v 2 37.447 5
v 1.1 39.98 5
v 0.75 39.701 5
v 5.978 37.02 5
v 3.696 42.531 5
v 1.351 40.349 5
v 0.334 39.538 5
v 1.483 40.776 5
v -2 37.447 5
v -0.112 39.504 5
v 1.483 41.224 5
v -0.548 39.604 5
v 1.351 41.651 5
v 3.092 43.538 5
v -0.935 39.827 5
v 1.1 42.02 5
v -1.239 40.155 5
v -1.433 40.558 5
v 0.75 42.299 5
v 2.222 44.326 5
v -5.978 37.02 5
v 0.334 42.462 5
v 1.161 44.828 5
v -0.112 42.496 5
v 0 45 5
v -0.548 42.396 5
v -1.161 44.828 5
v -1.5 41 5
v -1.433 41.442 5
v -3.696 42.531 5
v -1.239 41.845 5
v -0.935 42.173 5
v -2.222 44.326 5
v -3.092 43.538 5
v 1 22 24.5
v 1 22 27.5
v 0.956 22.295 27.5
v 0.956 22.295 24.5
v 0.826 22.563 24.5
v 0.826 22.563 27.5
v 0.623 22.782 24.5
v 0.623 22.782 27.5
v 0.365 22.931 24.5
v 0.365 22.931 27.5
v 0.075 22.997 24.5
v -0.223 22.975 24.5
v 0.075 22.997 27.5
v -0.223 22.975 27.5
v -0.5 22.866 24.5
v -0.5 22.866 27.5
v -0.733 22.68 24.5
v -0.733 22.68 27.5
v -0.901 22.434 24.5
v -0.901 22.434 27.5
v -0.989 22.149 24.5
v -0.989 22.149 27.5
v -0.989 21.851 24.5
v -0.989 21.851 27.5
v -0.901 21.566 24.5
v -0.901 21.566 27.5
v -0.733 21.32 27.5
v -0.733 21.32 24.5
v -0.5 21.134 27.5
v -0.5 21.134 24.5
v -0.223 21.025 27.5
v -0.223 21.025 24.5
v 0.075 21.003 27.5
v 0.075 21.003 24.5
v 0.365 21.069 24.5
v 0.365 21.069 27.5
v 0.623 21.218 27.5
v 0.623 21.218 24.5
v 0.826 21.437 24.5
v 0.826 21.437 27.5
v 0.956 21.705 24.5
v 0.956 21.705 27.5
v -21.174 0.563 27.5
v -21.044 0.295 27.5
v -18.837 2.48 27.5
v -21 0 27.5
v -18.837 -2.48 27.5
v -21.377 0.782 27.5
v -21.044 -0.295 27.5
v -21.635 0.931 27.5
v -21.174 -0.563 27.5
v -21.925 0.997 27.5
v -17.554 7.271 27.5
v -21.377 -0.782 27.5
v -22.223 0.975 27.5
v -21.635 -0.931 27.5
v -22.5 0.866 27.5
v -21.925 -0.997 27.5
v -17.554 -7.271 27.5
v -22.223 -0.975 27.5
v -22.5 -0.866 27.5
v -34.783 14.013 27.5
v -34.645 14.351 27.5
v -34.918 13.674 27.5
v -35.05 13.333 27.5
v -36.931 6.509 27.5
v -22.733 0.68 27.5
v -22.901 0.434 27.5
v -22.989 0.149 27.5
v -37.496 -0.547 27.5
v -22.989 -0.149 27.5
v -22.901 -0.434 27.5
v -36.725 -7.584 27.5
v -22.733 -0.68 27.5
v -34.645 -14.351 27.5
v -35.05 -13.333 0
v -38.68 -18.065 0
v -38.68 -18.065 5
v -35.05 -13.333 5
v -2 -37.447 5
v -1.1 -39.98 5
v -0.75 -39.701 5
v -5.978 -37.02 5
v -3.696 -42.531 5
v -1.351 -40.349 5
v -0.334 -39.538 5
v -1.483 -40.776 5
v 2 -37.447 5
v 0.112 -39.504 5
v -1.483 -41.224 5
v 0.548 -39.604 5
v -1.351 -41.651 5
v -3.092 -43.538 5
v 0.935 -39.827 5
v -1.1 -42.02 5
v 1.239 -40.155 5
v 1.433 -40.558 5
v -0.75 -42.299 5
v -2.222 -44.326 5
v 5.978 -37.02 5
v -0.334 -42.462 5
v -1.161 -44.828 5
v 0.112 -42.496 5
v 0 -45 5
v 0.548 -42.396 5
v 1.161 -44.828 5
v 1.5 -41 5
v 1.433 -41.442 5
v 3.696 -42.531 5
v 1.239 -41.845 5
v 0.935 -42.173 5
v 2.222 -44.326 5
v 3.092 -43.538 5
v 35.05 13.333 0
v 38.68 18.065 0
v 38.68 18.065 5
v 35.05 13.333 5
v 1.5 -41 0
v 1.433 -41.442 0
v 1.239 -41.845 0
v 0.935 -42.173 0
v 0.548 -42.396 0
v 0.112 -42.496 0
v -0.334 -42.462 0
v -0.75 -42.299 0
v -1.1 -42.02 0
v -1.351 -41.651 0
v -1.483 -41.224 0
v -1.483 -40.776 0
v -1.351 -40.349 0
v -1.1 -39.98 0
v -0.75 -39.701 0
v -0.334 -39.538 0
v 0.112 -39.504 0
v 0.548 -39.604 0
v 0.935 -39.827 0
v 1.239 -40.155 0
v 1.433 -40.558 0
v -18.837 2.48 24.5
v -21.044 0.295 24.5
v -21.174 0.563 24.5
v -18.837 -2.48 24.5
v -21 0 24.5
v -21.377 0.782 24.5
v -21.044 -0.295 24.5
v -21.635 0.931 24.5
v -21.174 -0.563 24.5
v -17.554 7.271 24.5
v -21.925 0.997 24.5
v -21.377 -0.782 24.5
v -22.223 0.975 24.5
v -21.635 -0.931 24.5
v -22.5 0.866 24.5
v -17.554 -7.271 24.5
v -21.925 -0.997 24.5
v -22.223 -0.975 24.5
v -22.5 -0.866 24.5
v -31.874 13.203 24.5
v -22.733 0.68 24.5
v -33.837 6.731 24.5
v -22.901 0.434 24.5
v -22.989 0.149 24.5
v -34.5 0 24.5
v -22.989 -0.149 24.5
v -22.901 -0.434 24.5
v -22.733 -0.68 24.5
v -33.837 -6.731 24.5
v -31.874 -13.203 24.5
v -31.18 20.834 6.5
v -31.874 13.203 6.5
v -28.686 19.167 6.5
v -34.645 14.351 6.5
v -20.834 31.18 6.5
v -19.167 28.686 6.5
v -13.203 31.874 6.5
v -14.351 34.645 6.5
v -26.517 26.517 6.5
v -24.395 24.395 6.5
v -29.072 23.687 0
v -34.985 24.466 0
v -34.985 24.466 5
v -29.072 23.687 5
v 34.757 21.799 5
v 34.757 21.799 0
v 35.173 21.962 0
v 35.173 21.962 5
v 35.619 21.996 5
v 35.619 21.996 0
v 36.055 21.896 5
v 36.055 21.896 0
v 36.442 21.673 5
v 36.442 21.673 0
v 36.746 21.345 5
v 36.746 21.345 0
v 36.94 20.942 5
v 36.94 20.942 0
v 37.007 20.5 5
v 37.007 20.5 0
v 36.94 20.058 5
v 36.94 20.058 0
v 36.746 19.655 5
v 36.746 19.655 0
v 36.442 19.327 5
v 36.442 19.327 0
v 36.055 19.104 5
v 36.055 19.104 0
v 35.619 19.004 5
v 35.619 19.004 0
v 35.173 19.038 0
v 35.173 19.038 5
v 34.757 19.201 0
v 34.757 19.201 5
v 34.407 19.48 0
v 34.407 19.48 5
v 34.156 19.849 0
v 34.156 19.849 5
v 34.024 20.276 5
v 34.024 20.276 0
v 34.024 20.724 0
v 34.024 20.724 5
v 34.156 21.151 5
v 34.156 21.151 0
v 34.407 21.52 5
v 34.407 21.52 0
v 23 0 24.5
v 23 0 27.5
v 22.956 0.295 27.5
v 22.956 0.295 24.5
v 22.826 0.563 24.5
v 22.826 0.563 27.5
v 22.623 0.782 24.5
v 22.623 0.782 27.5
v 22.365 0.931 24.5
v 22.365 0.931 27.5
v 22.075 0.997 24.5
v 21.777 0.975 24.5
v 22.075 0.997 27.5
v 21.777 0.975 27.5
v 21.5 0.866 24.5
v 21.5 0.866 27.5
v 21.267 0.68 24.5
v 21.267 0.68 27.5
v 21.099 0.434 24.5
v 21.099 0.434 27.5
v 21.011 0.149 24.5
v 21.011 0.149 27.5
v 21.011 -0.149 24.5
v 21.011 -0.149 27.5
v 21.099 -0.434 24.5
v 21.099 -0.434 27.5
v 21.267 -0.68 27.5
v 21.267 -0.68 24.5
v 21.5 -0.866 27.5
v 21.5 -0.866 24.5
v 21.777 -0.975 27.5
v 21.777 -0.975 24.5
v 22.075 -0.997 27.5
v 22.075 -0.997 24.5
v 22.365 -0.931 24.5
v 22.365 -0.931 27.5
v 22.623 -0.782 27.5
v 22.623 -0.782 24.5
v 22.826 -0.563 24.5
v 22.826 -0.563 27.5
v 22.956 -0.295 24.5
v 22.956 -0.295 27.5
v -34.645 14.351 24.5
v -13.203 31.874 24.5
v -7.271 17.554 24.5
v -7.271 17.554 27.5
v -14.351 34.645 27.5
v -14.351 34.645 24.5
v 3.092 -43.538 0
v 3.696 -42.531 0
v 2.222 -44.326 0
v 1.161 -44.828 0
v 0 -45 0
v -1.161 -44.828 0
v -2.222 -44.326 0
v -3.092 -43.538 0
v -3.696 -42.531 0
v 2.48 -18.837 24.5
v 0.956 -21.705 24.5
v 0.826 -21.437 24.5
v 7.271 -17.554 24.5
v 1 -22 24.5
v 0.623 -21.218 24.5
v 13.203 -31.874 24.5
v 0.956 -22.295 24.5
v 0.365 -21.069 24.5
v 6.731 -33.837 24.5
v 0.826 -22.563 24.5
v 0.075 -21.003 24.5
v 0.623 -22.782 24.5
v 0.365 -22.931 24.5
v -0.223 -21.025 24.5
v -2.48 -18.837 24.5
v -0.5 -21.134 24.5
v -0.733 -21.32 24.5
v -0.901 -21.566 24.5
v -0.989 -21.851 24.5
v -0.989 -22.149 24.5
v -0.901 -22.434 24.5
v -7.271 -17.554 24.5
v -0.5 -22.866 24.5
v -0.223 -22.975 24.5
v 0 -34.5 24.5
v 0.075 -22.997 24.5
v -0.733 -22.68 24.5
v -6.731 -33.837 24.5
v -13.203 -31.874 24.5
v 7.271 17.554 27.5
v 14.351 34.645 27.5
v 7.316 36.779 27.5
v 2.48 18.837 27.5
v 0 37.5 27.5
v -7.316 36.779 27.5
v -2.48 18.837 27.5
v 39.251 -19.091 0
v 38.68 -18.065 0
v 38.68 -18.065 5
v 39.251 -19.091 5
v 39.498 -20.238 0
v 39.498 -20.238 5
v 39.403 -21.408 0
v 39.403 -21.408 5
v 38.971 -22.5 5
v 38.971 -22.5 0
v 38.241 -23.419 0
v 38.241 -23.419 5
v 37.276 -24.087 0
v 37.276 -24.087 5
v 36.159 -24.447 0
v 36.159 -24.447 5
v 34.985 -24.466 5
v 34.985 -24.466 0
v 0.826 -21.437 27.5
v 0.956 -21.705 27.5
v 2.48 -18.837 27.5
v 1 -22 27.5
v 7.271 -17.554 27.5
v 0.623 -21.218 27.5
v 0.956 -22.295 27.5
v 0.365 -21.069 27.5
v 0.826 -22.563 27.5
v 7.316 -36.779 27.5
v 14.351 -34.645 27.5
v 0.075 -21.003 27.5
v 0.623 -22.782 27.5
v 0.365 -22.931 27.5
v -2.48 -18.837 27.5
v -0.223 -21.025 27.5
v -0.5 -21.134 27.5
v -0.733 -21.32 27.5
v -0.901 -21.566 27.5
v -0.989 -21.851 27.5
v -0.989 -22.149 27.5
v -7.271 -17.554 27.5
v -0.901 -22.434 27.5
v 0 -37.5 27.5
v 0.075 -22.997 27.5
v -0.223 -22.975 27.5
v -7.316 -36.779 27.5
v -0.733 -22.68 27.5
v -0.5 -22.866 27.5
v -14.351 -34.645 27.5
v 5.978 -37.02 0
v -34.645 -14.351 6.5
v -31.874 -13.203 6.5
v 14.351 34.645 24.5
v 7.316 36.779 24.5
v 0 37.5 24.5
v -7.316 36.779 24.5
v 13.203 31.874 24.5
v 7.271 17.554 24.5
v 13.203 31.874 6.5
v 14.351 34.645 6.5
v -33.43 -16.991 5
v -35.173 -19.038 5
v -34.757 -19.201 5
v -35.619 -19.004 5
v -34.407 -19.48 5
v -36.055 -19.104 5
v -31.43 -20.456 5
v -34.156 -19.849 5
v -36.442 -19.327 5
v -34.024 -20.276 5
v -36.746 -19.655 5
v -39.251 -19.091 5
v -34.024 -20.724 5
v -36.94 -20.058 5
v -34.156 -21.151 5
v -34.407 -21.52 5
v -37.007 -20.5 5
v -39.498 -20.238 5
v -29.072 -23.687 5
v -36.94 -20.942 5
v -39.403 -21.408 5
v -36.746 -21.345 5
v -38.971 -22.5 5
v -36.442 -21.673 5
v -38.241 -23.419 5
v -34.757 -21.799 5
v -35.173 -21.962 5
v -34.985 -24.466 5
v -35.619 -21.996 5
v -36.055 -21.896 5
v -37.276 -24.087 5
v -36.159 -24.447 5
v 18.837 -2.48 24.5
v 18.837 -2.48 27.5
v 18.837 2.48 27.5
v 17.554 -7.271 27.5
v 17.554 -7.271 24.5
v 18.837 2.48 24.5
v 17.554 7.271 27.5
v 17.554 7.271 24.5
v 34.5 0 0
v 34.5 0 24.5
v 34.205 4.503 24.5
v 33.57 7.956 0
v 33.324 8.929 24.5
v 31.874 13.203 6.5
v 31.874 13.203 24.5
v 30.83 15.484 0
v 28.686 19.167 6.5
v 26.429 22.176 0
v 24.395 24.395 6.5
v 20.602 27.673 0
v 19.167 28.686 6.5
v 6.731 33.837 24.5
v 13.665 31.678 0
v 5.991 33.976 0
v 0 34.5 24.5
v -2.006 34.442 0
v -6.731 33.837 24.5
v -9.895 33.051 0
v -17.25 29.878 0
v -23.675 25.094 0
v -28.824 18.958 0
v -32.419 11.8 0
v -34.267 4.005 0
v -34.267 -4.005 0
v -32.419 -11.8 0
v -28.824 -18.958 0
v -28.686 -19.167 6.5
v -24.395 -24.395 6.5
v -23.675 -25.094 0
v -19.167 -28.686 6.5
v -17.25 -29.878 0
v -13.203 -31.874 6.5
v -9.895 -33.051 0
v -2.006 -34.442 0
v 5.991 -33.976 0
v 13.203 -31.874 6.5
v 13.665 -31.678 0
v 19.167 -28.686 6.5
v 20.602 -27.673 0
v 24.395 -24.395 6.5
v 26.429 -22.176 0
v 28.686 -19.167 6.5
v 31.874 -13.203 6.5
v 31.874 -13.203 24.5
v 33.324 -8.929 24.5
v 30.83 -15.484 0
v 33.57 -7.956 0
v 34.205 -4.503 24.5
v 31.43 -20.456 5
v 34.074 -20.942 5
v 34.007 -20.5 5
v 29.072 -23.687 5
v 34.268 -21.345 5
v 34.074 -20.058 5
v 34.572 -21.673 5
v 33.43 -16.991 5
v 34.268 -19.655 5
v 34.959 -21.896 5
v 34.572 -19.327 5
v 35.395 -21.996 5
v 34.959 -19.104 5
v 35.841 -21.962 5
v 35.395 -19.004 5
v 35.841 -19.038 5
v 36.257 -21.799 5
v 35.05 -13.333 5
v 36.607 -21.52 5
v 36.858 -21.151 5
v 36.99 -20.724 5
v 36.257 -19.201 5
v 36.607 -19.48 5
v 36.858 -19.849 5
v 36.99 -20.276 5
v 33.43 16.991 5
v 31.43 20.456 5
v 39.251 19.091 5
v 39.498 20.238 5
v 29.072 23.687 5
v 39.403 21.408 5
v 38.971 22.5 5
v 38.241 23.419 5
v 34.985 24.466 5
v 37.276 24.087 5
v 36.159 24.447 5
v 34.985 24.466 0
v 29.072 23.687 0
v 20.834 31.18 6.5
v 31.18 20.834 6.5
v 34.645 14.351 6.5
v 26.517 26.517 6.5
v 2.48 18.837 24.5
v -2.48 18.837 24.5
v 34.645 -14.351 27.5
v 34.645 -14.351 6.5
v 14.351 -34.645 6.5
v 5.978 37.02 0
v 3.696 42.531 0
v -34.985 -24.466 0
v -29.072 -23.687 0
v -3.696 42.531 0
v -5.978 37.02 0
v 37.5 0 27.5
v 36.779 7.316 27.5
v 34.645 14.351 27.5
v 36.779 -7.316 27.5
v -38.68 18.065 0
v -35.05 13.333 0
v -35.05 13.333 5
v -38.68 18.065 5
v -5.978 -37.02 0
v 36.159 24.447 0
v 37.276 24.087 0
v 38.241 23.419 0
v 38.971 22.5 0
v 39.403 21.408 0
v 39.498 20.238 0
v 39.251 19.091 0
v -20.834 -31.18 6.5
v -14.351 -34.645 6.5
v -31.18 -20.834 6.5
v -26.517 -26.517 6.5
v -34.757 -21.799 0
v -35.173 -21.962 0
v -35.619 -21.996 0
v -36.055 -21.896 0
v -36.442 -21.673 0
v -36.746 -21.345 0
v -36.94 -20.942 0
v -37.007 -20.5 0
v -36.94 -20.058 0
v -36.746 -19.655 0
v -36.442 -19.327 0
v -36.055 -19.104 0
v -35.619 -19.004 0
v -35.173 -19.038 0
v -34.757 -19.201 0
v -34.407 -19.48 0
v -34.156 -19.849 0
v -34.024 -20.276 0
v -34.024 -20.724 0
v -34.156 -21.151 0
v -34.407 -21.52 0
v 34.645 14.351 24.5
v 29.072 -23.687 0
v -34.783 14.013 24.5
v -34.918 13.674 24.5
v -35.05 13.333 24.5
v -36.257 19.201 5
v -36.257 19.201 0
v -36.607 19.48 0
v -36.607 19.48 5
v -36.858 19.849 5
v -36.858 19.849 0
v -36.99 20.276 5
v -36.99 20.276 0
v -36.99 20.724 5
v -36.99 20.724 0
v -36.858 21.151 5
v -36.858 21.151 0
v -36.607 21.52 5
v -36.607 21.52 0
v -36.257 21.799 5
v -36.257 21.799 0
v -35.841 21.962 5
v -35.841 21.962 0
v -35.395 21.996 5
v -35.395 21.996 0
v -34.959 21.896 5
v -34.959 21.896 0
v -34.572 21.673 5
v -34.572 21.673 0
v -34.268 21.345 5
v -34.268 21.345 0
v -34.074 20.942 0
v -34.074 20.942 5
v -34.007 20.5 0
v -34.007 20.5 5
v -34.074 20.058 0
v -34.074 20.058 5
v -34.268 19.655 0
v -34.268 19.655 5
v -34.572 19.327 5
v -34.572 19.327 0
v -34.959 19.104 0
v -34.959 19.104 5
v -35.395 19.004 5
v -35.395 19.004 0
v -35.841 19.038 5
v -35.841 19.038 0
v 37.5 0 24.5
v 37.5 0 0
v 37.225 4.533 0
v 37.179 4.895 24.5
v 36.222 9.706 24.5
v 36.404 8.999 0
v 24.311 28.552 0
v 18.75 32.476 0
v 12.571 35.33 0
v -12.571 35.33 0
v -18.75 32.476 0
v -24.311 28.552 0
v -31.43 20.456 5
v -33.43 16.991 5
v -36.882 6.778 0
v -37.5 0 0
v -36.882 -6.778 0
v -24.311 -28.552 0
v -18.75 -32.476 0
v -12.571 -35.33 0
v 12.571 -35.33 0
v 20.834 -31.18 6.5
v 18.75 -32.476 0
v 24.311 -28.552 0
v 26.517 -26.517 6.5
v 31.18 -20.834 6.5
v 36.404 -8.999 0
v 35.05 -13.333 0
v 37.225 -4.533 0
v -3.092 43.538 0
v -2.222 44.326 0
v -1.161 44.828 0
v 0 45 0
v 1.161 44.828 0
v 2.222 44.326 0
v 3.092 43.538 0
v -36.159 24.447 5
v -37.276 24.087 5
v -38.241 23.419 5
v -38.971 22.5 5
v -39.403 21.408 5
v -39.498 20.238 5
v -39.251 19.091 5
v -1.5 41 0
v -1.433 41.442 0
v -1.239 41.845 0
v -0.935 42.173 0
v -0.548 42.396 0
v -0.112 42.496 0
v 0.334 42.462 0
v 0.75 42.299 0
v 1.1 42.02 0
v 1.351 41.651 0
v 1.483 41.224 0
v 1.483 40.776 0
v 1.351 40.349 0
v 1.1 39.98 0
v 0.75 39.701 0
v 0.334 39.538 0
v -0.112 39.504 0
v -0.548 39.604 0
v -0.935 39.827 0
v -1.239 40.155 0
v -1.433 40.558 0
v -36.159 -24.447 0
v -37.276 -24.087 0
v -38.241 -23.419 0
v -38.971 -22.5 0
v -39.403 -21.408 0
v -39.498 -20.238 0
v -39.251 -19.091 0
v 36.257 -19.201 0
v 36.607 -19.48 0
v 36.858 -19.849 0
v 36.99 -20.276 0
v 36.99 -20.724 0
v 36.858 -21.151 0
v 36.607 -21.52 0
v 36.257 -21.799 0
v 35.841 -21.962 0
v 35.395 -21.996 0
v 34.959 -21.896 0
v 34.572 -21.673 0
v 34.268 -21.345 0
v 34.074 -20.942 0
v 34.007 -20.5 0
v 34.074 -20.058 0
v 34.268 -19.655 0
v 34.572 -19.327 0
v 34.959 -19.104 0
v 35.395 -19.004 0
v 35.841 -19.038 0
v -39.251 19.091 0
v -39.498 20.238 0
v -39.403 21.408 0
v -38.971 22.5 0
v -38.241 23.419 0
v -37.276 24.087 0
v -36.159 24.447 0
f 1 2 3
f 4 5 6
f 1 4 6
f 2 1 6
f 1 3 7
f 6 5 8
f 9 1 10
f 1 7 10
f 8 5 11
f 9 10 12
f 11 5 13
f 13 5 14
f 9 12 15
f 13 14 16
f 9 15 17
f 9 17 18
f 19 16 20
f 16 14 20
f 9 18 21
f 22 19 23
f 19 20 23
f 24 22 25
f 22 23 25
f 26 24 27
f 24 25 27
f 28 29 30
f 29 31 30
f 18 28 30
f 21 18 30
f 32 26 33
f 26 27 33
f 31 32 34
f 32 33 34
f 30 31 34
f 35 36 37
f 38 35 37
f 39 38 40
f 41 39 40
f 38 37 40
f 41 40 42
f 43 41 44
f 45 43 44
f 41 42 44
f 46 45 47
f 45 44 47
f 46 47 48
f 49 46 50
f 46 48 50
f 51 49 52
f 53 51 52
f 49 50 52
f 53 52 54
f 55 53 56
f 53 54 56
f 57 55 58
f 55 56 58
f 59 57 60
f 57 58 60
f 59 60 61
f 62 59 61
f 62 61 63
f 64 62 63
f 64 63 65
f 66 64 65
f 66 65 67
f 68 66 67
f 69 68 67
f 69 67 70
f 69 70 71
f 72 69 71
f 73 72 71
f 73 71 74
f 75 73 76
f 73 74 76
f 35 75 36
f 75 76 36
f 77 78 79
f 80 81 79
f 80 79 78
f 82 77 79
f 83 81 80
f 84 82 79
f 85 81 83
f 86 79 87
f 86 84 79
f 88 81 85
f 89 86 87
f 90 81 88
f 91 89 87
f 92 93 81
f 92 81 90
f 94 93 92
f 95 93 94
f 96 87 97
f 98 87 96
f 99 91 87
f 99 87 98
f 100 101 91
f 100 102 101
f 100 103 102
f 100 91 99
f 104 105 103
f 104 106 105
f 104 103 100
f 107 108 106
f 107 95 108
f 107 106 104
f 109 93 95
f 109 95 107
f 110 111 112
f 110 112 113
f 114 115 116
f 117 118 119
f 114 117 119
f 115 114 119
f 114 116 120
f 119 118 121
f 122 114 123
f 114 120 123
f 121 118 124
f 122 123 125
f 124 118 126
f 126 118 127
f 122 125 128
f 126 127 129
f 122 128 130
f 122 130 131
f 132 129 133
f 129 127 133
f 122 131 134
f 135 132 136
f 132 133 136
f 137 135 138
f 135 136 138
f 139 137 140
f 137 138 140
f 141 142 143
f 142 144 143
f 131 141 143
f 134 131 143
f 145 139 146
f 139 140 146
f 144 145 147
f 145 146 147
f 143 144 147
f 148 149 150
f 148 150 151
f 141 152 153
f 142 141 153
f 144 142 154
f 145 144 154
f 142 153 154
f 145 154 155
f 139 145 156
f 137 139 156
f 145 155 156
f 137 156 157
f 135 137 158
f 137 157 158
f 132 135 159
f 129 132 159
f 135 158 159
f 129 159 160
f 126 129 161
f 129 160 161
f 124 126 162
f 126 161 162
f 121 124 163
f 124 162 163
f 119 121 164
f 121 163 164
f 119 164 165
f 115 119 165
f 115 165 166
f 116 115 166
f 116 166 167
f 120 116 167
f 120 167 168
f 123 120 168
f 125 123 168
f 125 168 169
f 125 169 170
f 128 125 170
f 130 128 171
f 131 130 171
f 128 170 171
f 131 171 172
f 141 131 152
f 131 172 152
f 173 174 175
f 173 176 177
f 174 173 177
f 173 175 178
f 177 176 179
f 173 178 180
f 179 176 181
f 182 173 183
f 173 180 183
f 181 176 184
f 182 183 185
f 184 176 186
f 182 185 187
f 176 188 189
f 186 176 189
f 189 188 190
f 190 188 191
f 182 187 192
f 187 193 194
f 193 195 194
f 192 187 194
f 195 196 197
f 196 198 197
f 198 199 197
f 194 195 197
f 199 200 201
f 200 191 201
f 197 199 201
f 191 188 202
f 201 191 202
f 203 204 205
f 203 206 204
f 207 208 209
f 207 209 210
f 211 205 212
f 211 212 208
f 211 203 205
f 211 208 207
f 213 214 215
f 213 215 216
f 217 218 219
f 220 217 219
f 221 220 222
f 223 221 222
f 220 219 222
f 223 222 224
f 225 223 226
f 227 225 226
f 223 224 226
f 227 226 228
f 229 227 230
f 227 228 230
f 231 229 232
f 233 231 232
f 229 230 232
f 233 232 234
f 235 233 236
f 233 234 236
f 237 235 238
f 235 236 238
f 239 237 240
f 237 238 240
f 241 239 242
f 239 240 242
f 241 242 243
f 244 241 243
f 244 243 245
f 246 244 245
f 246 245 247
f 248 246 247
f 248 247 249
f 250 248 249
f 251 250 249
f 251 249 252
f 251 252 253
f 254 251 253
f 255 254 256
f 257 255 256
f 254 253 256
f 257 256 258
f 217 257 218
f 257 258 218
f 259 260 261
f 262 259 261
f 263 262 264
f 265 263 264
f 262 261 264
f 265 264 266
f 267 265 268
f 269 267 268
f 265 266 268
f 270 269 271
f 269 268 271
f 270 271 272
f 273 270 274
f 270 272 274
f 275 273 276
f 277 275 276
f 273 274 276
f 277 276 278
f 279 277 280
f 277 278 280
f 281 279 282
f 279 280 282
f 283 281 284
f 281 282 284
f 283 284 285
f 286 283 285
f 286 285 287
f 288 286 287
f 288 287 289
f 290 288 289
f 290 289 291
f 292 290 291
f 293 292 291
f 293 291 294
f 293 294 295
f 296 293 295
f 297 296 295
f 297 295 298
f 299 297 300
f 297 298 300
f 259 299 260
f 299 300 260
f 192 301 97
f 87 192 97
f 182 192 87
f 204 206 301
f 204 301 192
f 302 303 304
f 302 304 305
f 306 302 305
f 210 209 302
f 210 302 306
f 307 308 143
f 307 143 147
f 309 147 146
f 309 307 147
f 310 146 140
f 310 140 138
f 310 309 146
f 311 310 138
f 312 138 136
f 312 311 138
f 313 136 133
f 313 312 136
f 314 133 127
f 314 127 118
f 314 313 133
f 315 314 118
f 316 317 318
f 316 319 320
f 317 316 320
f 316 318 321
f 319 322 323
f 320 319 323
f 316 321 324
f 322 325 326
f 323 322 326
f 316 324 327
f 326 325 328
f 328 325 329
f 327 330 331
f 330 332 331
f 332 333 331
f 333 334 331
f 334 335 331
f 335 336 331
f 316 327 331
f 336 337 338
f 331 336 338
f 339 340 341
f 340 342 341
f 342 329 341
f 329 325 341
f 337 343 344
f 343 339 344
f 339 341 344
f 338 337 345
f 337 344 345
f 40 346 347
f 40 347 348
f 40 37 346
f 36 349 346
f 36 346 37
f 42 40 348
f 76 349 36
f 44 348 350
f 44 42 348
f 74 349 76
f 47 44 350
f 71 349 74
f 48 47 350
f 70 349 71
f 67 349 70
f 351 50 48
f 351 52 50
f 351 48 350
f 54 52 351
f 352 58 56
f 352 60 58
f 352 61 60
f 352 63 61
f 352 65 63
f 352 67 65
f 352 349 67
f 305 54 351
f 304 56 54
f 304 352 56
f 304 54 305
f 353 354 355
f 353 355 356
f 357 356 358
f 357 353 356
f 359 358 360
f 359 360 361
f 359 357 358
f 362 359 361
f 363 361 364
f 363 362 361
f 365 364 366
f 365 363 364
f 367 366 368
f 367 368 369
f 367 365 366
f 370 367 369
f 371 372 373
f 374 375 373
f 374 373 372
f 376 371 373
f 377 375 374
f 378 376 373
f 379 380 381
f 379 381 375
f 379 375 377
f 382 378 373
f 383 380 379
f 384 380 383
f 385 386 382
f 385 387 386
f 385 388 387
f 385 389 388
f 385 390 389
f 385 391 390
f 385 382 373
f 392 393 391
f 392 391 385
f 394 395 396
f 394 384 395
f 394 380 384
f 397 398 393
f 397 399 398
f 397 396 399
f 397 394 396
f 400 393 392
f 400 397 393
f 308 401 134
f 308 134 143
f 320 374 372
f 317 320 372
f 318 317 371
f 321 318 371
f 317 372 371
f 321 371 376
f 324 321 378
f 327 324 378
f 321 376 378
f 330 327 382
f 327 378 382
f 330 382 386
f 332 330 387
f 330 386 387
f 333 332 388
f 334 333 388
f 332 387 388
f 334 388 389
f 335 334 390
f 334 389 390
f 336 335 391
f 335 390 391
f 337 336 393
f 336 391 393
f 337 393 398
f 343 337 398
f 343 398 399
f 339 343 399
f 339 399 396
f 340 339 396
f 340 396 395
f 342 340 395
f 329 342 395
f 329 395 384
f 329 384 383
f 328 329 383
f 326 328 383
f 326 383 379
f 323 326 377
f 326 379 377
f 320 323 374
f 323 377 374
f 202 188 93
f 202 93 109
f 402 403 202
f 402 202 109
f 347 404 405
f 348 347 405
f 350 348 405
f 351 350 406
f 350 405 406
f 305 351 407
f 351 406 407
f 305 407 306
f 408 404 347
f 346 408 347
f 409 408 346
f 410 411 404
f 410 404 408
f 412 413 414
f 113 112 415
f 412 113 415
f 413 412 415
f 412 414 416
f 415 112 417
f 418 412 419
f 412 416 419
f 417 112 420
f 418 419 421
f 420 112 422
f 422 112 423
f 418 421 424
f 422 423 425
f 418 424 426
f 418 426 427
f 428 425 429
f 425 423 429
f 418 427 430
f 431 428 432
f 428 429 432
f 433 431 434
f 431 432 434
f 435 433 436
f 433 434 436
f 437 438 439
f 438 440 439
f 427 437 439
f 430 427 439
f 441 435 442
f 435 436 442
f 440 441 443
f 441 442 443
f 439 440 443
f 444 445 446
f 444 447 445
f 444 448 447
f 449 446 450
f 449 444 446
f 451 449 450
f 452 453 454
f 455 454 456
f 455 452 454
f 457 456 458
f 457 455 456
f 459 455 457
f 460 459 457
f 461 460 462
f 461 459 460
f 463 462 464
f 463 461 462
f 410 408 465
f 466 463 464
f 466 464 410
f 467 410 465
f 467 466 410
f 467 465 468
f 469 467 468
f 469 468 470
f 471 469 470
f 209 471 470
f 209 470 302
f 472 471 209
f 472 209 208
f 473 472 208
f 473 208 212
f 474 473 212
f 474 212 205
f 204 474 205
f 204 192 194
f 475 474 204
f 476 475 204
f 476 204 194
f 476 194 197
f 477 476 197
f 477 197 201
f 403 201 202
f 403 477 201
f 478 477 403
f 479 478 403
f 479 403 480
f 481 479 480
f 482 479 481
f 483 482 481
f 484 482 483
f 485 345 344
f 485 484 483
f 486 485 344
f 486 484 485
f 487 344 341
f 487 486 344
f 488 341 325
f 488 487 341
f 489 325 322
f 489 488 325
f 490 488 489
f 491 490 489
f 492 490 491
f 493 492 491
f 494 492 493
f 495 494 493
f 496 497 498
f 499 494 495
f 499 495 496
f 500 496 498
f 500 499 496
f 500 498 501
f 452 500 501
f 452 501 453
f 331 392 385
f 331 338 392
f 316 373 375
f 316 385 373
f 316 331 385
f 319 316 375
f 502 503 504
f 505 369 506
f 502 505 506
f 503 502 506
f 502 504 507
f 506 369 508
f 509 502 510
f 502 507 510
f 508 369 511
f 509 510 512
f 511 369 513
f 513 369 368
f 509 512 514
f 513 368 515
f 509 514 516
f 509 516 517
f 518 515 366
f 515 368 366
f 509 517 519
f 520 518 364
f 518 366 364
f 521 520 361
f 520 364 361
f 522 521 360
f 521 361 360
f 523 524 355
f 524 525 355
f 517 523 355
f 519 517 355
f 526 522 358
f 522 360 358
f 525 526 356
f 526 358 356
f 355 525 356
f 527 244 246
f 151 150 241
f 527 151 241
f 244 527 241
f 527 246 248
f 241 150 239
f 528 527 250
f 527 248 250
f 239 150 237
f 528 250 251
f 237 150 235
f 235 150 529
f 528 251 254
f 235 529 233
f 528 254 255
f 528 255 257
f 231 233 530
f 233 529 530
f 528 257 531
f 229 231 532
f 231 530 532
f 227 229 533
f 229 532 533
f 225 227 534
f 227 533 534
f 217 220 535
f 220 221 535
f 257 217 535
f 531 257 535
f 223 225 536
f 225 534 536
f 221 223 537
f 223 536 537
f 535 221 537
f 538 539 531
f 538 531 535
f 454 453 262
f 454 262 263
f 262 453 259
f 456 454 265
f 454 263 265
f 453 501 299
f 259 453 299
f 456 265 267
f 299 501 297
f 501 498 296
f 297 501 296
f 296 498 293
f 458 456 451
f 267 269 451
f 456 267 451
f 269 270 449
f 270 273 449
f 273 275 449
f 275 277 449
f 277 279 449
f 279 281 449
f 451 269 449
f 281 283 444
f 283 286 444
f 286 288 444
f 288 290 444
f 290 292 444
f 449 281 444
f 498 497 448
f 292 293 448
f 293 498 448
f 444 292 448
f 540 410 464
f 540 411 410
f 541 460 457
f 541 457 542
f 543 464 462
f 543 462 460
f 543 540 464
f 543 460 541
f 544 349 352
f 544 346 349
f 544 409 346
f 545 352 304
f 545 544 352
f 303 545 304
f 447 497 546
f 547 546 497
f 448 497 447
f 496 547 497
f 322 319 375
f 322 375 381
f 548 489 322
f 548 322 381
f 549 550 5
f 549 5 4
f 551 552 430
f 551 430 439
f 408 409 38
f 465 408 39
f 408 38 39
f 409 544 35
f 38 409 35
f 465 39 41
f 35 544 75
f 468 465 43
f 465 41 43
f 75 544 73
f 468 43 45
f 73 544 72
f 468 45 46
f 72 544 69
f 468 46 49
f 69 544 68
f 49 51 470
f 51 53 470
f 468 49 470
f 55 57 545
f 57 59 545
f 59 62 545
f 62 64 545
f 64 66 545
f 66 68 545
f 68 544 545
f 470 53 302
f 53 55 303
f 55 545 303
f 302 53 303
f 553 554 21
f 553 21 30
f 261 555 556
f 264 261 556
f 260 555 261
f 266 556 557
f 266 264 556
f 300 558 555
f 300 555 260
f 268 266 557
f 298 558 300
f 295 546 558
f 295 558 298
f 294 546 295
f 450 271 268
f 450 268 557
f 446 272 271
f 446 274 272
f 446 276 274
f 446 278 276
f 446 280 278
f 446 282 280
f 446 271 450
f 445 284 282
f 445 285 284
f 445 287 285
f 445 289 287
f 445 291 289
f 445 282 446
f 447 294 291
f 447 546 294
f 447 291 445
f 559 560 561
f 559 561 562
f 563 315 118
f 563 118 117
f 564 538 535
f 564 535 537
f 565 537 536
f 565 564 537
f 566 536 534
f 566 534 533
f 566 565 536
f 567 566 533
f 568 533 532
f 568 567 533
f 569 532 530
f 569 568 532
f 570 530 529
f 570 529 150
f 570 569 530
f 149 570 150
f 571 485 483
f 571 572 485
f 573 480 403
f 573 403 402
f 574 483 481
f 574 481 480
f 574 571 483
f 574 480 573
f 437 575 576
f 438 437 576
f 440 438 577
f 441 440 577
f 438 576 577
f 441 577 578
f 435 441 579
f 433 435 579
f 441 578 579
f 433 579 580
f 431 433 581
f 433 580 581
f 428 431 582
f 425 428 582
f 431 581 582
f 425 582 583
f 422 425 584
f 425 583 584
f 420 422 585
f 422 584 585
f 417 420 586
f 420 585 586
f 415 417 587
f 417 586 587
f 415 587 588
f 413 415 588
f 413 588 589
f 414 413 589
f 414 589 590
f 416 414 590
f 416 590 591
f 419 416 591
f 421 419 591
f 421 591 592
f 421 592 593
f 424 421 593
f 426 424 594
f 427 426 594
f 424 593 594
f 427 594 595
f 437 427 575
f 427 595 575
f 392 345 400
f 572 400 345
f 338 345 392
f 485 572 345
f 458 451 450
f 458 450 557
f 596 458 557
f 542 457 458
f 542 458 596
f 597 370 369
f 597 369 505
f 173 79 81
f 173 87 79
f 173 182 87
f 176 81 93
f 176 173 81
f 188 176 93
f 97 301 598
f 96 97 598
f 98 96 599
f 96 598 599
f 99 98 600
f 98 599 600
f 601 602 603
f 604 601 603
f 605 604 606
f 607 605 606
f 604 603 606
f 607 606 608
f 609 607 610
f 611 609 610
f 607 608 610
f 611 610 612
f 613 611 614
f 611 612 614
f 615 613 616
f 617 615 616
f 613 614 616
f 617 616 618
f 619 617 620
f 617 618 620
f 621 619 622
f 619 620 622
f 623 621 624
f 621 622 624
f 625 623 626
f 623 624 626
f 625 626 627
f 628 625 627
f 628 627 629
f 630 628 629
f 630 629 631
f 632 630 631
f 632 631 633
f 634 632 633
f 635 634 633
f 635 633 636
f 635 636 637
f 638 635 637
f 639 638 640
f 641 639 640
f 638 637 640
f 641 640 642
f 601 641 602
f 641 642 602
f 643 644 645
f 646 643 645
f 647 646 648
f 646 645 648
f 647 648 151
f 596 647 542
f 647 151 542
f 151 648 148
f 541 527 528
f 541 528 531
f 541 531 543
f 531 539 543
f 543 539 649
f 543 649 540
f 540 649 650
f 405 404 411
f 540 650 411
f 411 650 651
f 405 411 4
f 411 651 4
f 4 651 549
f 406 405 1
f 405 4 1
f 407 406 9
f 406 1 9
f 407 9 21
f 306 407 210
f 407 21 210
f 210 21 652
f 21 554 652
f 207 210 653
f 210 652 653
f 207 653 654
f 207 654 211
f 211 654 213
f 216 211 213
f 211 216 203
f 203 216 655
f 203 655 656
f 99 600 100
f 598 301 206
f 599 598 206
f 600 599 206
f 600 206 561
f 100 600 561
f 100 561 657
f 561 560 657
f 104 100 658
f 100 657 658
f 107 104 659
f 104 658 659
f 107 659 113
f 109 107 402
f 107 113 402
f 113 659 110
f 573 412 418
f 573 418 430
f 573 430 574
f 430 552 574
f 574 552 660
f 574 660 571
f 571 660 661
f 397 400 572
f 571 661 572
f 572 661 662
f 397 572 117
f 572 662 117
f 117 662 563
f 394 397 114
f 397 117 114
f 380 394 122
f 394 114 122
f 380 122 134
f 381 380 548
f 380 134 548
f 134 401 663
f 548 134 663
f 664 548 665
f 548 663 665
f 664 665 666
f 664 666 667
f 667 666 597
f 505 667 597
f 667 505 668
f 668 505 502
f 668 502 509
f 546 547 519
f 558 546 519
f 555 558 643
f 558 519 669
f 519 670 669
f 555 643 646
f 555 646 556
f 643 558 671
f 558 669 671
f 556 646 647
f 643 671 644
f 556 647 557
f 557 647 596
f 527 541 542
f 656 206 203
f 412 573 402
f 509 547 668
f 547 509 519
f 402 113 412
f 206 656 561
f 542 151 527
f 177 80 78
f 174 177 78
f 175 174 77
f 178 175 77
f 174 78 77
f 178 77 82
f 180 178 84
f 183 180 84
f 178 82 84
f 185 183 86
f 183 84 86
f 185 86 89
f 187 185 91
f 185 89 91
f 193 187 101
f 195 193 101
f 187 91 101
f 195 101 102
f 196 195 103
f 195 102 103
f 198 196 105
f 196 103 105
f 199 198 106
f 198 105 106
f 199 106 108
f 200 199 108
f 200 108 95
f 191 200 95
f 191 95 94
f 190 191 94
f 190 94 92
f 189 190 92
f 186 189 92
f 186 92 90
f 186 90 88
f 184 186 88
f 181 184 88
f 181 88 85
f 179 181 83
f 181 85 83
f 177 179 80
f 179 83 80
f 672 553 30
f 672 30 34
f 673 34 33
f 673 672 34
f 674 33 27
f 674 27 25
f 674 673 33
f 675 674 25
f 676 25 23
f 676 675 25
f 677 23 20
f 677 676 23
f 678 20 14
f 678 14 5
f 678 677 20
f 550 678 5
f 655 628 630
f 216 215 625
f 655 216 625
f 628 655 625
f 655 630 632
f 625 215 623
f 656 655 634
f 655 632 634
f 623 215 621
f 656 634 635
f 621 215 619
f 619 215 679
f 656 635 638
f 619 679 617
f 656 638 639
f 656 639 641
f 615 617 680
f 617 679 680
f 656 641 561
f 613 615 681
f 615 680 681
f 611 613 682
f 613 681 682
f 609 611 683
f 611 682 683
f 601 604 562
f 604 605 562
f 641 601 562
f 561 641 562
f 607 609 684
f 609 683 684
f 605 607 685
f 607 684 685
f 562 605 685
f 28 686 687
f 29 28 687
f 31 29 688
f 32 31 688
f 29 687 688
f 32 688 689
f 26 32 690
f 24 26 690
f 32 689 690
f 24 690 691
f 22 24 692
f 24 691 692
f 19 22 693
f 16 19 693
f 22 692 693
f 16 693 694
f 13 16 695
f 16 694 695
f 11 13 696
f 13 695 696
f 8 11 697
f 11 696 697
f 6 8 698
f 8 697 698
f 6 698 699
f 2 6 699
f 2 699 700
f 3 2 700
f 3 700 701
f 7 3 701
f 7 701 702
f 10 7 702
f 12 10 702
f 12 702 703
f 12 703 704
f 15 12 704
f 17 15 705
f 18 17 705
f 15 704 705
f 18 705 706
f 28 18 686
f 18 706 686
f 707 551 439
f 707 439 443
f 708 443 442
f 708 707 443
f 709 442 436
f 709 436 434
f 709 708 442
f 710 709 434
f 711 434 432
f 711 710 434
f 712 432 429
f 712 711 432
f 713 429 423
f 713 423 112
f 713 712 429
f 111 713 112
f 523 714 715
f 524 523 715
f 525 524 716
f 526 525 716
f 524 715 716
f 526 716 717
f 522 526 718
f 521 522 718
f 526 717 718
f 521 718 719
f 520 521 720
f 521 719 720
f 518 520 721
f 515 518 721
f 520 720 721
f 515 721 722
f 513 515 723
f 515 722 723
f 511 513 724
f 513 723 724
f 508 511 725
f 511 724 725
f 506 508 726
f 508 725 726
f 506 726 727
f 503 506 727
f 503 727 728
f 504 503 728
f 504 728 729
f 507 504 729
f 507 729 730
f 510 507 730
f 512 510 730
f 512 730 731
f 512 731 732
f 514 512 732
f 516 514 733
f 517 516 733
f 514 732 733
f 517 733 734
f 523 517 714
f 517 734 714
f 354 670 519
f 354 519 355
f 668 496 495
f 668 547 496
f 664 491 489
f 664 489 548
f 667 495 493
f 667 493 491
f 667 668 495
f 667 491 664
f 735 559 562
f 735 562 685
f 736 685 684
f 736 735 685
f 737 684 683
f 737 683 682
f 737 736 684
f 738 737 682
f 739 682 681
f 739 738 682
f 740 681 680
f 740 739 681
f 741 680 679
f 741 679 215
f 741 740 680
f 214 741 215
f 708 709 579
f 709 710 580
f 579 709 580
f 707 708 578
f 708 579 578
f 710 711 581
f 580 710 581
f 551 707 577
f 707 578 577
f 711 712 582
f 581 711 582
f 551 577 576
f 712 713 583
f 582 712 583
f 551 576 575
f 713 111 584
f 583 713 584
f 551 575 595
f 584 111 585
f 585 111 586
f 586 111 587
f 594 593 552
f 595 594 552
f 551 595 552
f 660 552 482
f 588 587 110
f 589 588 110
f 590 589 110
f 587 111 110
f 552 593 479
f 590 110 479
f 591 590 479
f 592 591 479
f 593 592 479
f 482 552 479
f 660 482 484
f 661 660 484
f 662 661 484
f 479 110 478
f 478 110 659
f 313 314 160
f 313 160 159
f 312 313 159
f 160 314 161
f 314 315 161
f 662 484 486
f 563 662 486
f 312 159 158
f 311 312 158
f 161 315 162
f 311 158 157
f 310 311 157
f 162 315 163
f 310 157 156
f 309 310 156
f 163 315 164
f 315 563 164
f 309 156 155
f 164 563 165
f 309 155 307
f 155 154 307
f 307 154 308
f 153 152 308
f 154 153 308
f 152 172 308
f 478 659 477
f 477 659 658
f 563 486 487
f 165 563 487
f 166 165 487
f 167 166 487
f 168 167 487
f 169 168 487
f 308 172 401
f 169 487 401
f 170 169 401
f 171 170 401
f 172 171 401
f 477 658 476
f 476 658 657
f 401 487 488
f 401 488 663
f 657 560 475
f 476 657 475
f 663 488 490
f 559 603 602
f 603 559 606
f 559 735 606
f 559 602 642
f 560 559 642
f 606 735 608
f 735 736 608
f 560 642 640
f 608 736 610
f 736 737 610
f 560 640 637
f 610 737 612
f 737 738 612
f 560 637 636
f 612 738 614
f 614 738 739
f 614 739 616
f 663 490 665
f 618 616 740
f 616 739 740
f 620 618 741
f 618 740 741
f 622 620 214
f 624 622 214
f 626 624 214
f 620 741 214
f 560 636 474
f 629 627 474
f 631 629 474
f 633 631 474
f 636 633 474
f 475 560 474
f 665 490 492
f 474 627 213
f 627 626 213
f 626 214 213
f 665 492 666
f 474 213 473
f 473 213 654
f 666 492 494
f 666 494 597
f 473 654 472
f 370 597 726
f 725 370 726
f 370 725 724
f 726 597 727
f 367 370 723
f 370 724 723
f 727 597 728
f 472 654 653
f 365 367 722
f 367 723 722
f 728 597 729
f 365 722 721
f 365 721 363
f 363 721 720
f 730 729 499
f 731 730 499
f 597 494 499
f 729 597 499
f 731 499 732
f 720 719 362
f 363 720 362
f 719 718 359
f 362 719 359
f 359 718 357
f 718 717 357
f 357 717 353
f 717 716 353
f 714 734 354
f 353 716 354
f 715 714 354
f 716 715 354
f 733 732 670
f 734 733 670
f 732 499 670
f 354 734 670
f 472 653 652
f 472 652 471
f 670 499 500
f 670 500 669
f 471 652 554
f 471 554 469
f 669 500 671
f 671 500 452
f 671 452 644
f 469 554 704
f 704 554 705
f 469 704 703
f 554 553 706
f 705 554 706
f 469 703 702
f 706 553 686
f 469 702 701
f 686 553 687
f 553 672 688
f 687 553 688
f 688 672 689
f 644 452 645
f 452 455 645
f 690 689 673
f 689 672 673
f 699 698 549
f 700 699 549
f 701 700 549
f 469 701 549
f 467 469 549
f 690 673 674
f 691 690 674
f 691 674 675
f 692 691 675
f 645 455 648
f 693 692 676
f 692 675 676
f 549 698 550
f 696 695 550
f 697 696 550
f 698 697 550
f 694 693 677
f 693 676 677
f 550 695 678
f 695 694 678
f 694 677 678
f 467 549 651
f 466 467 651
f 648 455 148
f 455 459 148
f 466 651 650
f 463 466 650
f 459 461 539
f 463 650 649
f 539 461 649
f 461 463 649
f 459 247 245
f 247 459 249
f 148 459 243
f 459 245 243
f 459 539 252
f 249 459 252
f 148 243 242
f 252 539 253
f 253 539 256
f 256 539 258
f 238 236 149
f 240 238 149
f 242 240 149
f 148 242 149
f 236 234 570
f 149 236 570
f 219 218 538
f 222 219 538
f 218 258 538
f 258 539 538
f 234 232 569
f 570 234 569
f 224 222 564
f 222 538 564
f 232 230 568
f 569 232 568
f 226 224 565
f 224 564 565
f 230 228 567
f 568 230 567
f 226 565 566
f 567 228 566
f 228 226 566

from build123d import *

# Parameters (mm, degrees)
SKETCH_1_R               = 37.5
SKETCH_1_R_2             = 34.5
EXTRUDE_1_DEPTH          = 24.5
SKETCH_2_R               = 1.5
EXTRUDE_2_DEPTH          = 5
PATTERN_CIRCULAR_1_COUNT = 6
SKETCH_3_R               = 37.5
SKETCH_3_R_2             = 19
EXTRUDE_3_DEPTH          = 3
SKETCH_4_R               = 1
CUT_EXTRUDE_1_DEPTH      = 3
CUT_EXTRUDE_START        = -21
CUT_EXTRUDE_2_DEPTH      = 21
PATTERN_CIRCULAR_2_COUNT = 4


with BuildPart() as part:
    # Эскиз1 → Бобышка-Вытянуть1 (new body)
    with BuildSketch(Plane.XY):
        Circle(SKETCH_1_R)
        Circle(SKETCH_1_R_2, mode=Mode.SUBTRACT)
    extrude(amount=EXTRUDE_1_DEPTH)

    # Эскиз2 → Бобышка-Вытянуть2 (add)
    with BuildSketch(Plane(origin=(0, 0, 0), x_dir=(-1, 0, 0), z_dir=(0, 0, -1))):
        with BuildLine():
            Line((-3.69551813, 42.530733729), (-5.977950182, 37.020455313))
            ThreePointArc((-5.977950182, 37.020455313), (0, 37.5), (5.977950182, 37.020455313))
            Line((5.977950182, 37.020455313), (3.69551813, 42.530733729))
            ThreePointArc((3.69551813, 42.530733729), (0, 45), (-3.69551813, 42.530733729))
        make_face()
        with Locations((0, 41)):
            Circle(SKETCH_2_R, mode=Mode.SUBTRACT)
    extrude_2 = extrude(amount=-EXTRUDE_2_DEPTH)

    # Круговой массив1: Бобышка-Вытянуть2 ×6 about axis
    pattern_circular_1_axis = Axis((0, 0, 0), (0, 0, 1))
    for i in range(1, PATTERN_CIRCULAR_1_COUNT):
        add(extrude_2.rotate(pattern_circular_1_axis, i * 360 / PATTERN_CIRCULAR_1_COUNT))

    # Эскиз3 → Бобышка-Вытянуть3 (add)
    with BuildSketch(Plane.XY.offset(24.5)):
        with Locations(Location((0, 0, 0), (0, 0, 159.172768539))):
            Circle(SKETCH_3_R)
        Circle(SKETCH_3_R_2, mode=Mode.SUBTRACT)
    extrude(amount=EXTRUDE_3_DEPTH)

    # Эскиз4 → Вырез-Вытянуть1 (cut)
    with BuildSketch(Plane.XY.offset(27.5)):
        with Locations((22, 0)):
            Circle(SKETCH_4_R)
        with Locations((0, -22)):
            Circle(SKETCH_4_R)
        with Locations((-22, 0)):
            Circle(SKETCH_4_R)
        with Locations((0, 22)):
            Circle(SKETCH_4_R)
    extrude(amount=-CUT_EXTRUDE_1_DEPTH, mode=Mode.SUBTRACT)

    # Эскиз5 → Вырез-Вытянуть2 (cut)
    with BuildSketch(Plane.XY.offset(27.5).offset(CUT_EXTRUDE_START)):
        with BuildLine():
            Line((0, 0), (34.645482469, 14.350628714))
            ThreePointArc((34.645482469, 14.350628714), (26.516504294, 26.516504294), (14.350628714, 34.645482469))
            Line((14.350628714, 34.645482469), (0, 0))
        make_face()
    cut_extrude_2 = extrude(amount=CUT_EXTRUDE_2_DEPTH, mode=Mode.SUBTRACT)

    # Круговой массив2: Вырез-Вытянуть2 ×4 about axis
    pattern_circular_2_axis = Axis((0, 0, 24.5), (0, 0, -1))
    for i in range(1, PATTERN_CIRCULAR_2_COUNT):
        add(cut_extrude_2.rotate(pattern_circular_2_axis, i * 360 / PATTERN_CIRCULAR_2_COUNT), mode=Mode.SUBTRACT)


solid = part.part
